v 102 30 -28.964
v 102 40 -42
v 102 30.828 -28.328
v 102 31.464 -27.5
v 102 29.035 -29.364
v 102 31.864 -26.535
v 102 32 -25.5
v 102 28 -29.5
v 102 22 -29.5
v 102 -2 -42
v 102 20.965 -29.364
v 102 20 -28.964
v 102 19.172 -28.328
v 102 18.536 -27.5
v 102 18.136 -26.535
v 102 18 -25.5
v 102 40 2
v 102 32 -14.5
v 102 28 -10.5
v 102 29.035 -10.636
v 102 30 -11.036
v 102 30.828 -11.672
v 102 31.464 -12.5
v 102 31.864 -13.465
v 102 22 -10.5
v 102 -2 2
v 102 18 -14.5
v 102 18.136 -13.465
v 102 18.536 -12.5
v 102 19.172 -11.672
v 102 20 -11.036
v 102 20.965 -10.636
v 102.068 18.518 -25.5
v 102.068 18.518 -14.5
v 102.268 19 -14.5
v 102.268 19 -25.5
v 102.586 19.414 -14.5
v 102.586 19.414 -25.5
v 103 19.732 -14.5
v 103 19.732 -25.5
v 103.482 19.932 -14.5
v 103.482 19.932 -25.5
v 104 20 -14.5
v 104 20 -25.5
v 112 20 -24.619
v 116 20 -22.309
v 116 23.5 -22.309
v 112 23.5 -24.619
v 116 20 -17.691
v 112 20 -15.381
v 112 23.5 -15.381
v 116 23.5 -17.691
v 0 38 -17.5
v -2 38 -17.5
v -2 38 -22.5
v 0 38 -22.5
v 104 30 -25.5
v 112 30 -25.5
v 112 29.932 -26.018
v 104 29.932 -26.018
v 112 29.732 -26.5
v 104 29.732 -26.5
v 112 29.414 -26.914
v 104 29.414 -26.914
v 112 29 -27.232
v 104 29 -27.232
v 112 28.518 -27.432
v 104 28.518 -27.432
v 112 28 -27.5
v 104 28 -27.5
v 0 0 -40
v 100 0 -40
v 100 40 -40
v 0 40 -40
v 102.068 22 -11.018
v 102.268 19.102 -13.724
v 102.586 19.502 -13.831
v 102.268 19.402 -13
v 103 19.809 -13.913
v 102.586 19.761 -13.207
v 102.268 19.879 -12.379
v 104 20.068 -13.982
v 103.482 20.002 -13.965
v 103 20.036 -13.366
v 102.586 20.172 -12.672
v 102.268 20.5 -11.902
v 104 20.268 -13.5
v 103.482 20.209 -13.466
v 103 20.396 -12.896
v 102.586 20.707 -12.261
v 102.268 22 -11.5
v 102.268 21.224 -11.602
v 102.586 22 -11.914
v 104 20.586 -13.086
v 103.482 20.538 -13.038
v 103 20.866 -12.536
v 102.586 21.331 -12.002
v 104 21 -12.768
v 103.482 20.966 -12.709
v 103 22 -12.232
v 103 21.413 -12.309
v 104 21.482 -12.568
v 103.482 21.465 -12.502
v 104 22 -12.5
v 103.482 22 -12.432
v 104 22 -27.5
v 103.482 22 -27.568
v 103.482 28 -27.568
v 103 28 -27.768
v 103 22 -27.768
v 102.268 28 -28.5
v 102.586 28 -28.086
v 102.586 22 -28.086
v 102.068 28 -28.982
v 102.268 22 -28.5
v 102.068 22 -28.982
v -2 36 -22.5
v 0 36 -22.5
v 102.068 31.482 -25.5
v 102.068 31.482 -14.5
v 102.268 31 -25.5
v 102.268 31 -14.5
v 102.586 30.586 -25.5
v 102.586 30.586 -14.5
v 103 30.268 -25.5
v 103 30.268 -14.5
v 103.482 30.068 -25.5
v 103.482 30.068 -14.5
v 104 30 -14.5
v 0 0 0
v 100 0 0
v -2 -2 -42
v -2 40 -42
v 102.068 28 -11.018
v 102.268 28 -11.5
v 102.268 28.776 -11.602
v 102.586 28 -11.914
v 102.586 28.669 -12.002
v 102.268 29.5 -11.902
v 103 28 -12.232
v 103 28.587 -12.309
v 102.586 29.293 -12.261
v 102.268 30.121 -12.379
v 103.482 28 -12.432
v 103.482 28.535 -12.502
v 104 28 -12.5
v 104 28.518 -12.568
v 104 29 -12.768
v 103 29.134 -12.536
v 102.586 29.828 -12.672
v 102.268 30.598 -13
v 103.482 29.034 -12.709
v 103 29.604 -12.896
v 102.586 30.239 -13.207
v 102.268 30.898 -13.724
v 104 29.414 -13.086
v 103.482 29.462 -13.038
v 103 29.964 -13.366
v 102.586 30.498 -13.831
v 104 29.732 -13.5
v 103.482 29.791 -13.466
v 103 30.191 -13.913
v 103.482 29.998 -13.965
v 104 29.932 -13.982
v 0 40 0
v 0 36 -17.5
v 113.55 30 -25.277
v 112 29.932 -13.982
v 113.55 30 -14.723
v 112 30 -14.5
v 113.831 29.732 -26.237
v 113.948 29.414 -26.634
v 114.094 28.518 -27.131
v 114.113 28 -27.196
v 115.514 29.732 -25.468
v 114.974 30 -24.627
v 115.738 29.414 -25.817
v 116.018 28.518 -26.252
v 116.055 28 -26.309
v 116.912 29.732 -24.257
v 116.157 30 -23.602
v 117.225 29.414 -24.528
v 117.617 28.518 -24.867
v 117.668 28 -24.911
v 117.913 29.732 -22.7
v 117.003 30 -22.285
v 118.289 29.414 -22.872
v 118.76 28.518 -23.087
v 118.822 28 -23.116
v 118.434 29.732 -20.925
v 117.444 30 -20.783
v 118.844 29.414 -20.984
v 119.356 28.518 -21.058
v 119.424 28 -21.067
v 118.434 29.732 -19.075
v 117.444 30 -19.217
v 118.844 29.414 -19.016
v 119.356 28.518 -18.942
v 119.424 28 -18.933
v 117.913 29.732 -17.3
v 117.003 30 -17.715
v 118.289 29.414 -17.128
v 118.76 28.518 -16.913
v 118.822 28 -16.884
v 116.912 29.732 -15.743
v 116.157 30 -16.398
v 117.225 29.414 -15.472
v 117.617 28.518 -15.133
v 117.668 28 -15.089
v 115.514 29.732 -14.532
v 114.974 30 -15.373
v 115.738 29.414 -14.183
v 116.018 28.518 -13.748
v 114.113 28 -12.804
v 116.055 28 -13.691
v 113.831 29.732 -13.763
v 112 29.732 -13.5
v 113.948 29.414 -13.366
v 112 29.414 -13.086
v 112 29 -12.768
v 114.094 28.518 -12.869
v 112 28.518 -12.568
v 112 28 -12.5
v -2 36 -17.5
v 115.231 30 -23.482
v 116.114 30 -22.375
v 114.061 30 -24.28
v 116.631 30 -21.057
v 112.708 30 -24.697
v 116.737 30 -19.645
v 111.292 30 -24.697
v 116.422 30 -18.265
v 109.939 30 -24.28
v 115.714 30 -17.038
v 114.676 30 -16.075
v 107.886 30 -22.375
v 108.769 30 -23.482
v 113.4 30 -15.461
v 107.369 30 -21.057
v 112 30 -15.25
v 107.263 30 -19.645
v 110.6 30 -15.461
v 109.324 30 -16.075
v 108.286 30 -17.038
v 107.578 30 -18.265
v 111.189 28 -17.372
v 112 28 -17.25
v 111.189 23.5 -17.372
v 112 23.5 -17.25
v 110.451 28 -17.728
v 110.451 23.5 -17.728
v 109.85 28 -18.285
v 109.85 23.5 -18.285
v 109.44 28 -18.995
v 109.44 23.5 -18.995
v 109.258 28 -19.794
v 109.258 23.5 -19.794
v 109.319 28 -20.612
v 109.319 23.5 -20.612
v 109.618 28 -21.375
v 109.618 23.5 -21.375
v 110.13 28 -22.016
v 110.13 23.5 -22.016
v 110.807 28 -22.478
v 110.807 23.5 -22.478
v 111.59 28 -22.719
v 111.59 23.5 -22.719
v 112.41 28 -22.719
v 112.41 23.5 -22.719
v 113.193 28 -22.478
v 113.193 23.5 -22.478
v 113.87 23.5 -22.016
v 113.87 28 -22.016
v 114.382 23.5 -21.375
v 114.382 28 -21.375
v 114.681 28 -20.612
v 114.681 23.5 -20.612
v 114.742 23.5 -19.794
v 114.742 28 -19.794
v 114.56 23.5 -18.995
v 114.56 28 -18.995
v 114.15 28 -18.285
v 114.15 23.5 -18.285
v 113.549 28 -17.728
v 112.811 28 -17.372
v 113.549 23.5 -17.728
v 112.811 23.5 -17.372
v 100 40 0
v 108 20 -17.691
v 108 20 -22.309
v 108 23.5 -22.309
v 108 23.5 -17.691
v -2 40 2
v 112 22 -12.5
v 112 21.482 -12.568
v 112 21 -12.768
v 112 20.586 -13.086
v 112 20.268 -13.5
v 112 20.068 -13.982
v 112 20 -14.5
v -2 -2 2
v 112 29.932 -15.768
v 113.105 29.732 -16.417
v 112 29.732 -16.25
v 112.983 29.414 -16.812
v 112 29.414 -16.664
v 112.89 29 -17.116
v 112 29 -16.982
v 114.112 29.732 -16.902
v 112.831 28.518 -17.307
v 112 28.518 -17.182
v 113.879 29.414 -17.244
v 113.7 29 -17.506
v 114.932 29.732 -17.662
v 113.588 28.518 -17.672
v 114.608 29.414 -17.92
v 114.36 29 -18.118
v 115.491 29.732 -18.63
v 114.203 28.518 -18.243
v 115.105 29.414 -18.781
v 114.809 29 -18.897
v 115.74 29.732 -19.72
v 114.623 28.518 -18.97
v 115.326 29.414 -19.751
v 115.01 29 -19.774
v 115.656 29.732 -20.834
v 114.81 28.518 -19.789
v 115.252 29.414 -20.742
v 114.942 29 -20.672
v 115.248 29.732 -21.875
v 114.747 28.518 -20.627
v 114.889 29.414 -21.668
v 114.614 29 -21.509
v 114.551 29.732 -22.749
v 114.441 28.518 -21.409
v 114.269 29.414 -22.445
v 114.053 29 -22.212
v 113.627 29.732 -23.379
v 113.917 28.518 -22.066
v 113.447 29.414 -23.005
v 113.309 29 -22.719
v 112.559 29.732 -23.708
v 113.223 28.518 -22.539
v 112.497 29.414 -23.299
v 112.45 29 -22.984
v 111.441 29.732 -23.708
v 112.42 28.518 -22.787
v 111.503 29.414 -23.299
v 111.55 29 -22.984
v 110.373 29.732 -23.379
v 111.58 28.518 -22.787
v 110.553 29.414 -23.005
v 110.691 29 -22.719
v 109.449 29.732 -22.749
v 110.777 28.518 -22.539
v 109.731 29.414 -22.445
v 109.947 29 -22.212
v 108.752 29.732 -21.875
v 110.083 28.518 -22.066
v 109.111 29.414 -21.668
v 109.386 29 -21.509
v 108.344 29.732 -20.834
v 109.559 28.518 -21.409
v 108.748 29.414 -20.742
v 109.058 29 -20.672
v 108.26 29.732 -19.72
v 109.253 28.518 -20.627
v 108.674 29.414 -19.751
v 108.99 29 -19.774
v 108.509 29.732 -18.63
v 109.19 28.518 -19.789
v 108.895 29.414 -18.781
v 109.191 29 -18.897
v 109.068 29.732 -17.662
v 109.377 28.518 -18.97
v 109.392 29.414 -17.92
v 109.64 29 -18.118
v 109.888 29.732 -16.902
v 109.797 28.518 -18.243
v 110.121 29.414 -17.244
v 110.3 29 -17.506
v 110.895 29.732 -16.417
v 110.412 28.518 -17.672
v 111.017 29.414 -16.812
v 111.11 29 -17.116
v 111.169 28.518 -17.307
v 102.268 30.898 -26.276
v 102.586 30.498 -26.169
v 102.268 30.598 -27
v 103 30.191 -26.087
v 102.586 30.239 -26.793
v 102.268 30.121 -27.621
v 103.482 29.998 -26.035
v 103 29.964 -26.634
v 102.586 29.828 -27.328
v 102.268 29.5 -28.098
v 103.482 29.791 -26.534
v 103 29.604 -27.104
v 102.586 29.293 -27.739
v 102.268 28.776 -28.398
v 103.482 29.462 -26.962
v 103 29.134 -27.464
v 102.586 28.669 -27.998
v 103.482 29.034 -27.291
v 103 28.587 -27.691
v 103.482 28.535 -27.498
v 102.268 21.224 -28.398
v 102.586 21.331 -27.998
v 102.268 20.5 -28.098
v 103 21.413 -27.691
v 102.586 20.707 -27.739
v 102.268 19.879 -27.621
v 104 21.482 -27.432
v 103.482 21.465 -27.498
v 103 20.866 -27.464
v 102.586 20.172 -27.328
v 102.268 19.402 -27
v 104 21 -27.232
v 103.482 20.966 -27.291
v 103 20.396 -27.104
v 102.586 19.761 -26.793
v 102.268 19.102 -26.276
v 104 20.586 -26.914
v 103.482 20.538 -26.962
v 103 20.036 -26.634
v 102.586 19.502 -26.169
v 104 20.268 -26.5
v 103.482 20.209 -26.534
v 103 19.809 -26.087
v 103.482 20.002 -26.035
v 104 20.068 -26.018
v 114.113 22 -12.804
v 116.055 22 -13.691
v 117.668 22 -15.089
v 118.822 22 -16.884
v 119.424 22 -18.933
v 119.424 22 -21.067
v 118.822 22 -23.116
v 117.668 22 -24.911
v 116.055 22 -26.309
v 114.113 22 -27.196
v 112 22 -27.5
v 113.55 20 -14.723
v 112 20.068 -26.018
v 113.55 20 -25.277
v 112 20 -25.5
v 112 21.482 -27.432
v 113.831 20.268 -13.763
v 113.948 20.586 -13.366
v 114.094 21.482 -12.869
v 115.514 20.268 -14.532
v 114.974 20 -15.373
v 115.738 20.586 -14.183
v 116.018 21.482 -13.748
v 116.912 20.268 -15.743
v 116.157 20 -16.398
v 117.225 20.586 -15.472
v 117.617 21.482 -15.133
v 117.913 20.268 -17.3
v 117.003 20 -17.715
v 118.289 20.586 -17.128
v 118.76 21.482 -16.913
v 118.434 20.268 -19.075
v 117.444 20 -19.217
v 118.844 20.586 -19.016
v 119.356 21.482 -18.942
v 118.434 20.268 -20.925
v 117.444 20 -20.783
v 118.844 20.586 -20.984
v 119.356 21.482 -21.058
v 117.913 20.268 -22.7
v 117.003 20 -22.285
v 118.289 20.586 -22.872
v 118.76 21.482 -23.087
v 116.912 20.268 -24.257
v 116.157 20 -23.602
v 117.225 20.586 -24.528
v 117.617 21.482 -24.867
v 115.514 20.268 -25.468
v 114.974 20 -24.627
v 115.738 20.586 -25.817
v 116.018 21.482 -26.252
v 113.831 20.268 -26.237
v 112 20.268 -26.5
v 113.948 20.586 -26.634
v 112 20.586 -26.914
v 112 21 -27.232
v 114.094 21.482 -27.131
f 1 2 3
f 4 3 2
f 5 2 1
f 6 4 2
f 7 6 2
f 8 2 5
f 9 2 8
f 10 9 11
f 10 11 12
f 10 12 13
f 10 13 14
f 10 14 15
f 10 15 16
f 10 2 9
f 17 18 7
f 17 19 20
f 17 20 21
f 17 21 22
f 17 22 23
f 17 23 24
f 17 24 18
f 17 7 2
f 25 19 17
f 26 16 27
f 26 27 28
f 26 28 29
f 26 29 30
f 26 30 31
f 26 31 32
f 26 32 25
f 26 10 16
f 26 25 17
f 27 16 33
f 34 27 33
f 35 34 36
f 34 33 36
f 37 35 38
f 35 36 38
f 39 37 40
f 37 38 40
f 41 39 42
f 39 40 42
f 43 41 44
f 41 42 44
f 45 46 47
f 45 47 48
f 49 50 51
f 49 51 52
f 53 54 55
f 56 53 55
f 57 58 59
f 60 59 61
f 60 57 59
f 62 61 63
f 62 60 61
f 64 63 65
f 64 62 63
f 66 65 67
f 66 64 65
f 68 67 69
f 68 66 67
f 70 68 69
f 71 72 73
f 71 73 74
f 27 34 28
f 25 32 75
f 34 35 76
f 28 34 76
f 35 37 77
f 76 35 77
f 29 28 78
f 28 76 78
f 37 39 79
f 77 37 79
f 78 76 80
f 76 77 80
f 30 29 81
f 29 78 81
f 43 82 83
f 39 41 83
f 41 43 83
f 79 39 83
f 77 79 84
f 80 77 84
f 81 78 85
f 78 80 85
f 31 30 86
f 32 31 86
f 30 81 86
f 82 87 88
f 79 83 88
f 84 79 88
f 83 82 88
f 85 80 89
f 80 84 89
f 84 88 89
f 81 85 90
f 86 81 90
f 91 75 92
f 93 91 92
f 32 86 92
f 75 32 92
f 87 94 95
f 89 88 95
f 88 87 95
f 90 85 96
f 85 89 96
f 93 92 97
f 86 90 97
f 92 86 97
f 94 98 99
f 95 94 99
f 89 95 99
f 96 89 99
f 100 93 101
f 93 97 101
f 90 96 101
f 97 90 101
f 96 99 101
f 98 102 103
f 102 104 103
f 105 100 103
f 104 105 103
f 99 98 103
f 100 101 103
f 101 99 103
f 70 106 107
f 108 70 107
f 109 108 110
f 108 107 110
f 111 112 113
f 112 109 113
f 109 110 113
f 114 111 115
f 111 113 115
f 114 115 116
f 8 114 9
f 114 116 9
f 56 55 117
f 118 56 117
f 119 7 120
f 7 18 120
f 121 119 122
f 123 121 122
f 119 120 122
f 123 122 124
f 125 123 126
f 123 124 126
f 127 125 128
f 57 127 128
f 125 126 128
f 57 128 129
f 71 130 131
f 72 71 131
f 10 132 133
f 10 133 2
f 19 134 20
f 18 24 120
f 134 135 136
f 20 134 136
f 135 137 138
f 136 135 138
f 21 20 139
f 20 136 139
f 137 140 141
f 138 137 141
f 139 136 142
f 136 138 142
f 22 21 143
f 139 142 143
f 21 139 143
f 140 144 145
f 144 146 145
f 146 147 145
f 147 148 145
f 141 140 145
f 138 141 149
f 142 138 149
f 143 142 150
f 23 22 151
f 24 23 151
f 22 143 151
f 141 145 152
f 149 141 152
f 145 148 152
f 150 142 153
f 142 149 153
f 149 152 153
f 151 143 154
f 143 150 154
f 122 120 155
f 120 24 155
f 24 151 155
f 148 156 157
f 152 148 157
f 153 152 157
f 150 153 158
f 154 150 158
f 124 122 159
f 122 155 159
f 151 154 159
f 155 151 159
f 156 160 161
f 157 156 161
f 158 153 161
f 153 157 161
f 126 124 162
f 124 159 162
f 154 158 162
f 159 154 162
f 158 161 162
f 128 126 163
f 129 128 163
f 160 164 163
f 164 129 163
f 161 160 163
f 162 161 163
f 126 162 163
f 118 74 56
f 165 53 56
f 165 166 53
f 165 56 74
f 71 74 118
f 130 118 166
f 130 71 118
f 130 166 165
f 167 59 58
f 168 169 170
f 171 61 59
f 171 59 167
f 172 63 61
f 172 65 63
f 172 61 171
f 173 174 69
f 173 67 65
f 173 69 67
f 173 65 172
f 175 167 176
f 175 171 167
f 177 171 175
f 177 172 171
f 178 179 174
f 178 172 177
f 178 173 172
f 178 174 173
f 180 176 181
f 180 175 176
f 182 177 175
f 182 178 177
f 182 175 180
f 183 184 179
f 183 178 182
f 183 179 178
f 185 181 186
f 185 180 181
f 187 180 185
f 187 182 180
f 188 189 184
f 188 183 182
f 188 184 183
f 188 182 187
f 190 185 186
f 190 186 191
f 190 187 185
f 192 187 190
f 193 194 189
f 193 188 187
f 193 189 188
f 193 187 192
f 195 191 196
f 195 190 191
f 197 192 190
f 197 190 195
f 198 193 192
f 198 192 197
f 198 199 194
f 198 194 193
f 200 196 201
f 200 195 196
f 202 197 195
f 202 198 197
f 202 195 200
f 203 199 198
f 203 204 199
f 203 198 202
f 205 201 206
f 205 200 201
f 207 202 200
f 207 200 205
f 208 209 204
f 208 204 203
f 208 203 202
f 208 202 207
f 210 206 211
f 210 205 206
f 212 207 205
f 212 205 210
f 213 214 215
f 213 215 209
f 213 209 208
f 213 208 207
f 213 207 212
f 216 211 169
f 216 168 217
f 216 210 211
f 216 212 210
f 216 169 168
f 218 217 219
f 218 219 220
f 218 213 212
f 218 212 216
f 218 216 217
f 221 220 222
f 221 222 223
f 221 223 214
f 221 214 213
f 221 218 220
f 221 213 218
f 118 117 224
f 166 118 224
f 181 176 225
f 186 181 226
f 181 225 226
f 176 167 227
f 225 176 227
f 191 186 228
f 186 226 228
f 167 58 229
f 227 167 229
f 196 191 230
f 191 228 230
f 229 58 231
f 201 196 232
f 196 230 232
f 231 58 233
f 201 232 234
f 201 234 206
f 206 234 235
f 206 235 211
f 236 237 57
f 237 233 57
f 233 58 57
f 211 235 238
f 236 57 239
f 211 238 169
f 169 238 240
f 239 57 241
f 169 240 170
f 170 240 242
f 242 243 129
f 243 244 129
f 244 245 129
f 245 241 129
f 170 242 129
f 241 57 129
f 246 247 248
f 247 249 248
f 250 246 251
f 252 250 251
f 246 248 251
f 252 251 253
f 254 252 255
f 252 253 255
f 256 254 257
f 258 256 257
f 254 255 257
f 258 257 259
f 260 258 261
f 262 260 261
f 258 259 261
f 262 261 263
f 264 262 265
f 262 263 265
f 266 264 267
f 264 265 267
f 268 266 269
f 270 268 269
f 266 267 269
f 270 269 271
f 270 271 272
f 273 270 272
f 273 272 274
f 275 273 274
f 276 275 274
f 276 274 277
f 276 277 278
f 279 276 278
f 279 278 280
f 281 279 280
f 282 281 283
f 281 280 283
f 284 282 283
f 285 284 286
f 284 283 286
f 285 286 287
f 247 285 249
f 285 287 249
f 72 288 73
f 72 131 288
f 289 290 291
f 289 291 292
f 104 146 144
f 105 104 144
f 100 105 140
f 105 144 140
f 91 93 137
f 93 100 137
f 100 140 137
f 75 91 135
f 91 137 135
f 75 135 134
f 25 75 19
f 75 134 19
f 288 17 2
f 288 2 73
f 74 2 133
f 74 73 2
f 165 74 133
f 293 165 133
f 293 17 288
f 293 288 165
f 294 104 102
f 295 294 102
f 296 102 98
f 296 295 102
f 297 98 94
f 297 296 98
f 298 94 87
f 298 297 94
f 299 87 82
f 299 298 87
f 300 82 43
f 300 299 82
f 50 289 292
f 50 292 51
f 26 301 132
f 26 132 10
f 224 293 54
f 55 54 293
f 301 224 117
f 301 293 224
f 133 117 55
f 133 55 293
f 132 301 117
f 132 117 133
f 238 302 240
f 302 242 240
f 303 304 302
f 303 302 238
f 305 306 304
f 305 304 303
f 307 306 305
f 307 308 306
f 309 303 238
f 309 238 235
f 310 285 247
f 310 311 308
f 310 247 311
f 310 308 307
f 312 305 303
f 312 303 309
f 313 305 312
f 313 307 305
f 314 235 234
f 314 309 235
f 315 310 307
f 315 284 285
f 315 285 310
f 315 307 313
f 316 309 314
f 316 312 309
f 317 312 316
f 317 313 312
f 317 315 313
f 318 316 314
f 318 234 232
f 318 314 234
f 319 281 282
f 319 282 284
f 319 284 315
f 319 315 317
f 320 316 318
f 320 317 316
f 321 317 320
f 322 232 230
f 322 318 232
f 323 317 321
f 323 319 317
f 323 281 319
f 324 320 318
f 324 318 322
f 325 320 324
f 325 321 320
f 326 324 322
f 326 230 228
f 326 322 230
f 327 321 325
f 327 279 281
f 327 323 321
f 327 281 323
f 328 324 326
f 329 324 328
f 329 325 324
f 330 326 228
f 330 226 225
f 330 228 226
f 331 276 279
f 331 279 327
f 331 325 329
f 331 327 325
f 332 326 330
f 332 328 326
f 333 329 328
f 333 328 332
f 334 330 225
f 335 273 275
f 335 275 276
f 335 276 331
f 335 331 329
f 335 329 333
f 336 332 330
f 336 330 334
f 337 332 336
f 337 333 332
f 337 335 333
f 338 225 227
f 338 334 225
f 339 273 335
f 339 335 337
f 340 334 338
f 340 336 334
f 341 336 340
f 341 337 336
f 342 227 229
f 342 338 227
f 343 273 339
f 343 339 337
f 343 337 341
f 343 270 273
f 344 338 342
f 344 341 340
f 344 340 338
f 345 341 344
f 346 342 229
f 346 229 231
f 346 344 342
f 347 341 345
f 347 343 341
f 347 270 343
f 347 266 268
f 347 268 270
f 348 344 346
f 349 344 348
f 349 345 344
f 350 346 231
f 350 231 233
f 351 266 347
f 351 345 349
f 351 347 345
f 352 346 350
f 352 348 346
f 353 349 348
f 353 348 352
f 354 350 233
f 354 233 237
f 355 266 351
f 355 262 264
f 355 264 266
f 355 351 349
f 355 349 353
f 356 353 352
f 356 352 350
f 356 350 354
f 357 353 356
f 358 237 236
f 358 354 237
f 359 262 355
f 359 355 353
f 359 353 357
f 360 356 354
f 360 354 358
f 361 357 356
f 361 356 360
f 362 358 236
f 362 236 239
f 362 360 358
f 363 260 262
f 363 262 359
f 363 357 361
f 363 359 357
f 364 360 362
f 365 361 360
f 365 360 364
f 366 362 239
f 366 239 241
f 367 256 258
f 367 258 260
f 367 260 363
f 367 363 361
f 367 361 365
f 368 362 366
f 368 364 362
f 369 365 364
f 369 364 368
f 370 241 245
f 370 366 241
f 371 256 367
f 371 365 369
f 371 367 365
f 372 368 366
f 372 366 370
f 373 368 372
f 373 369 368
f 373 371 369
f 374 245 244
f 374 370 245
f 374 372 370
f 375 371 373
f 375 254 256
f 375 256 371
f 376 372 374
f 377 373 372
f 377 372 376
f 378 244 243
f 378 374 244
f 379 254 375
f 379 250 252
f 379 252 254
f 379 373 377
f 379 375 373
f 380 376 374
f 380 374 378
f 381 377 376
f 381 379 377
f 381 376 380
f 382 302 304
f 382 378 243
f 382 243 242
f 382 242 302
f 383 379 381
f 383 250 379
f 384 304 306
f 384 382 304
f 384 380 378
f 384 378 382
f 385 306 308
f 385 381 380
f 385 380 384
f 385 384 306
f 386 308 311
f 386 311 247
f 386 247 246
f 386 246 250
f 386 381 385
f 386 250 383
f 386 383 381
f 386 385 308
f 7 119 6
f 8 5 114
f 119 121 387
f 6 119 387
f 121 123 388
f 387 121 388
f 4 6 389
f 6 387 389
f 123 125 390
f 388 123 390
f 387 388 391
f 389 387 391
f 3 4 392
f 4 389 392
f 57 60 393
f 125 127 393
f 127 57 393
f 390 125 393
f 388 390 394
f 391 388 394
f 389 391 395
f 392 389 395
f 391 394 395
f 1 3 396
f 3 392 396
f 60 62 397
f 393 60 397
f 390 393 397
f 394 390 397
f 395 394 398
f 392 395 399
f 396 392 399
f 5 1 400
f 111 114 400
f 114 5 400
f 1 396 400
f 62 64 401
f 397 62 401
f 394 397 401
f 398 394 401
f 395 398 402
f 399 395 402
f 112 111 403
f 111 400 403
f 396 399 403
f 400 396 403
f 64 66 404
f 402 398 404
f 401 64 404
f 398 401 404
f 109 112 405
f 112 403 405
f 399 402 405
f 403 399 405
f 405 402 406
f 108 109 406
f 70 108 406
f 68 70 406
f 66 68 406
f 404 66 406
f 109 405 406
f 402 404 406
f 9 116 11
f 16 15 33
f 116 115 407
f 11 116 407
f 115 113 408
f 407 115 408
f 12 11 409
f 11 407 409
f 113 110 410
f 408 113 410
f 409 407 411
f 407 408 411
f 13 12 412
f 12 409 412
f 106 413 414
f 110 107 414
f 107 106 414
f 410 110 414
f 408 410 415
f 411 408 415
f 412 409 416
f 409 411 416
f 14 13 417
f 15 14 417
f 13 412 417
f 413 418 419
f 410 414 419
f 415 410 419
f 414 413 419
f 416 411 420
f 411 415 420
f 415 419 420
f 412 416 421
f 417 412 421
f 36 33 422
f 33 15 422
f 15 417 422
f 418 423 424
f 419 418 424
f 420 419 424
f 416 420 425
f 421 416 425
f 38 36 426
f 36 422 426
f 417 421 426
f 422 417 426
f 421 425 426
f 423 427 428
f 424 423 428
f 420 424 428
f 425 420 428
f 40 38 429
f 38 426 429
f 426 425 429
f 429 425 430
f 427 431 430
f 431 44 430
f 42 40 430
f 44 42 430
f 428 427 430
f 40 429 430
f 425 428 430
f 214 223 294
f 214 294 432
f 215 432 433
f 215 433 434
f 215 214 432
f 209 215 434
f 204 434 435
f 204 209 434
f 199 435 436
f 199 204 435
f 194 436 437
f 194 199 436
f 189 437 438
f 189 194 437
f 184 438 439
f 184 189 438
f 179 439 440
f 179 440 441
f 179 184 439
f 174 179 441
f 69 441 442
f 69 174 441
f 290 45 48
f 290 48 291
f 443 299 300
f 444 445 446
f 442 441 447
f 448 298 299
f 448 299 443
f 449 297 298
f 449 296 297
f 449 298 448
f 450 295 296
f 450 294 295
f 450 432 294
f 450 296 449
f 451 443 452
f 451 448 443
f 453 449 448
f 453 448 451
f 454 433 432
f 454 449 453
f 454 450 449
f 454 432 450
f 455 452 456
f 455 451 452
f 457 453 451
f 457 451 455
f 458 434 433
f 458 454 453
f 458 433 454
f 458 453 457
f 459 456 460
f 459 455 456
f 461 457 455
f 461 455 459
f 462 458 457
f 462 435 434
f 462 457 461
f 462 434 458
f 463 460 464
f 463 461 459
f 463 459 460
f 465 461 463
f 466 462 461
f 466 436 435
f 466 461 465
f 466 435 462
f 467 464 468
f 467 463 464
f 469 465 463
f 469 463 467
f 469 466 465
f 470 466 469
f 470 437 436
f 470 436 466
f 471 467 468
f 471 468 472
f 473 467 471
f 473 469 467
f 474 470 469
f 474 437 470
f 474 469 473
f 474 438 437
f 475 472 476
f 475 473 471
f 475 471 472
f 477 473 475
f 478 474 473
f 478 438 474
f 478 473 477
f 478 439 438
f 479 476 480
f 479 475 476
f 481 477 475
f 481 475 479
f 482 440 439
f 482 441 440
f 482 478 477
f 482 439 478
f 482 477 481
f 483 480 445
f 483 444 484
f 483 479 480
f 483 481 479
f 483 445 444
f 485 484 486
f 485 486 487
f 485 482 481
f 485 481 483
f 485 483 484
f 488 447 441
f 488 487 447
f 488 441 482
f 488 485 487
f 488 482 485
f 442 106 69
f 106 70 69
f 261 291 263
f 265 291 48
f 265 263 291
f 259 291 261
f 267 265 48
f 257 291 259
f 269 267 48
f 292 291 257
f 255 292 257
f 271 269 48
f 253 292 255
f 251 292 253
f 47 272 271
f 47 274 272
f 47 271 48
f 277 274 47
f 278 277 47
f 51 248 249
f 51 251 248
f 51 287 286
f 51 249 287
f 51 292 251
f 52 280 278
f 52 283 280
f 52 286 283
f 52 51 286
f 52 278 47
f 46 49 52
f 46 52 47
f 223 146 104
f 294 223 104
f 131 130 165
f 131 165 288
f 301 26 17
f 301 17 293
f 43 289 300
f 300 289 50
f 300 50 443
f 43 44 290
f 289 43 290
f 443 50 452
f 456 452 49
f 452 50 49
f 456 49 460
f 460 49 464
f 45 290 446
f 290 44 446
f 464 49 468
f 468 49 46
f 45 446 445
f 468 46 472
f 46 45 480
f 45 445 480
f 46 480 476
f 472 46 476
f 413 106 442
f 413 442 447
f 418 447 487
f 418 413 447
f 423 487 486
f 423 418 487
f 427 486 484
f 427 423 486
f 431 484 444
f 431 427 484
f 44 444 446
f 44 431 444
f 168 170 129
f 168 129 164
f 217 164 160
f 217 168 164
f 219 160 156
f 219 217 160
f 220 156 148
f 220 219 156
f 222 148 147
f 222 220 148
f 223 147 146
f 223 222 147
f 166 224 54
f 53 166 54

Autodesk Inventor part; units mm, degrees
ref_plane "YZ Plane" through (0, 0, 0) normal (1, 0, 0) x (0, 1, 0)
ref_plane "XZ Plane" through (0, 0, 0) normal (0, 1, 0) x (-1, 0, 0)
ref_plane "XY Plane" through (0, 0, 0) normal (0, 0, 1) x (1, 0, 0)
sketch "Sketch1" plane through (0, 0, 0) normal (0, 1, 0) x (-1, 0, 0)
  line L0 (0, 0) -> (-100, 0)
  line L1 (-100, 0) -> (-100, -40)
  line L2 (-100, -40) -> (0, -40)
  line L3 (0, -40) -> (0, 0)
  line L4 (2, -42) -> (-102, -42)
  line L5 (-102, -42) -> (-102, 2)
  line L6 (-102, 2) -> (2, 2)
  line L7 (2, 2) -> (2, -42)
  dimension "Length" = 100
  dimension "Width" = 40
  dimension "Thickness" = 2
extrude "Extrusion1" add sketch "Sketch1" along normal blind 40
sketch "Sketch2" plane through (0, 0, 0) normal (0, -1, 0) x (1, 0, 0)
  line L0 (102, -42) -> (102, 2) projected
  line L1 (102, 2) -> (-2, 2) projected
  line L2 (-2, -42) -> (102, -42) projected
  line L3 (-2, 2) -> (-2, -42) projected
  point P0 (0, 0)
extrude "Extrusion2" add sketch "Sketch2" along normal blind 2
sketch "Sketch3" plane through (-2, 40, -42) normal (-1, 0, 0) x (0, 0, 1)
  line L0 (0, 0) -> (44, 0) projected
  line L1 (19.5, -4) -> (24.5, -4)
  line L2 (24.5, -4) -> (24.5, -2)
  line L3 (24.5, -2) -> (19.5, -2)
  line L4 (19.5, -2) -> (19.5, -4)
  line L5 (19.5, -4) -> (24.5, -2) construction
  line L6 (24.5, -4) -> (19.5, -2) construction
  line L7 (22, -3) -> (22, 0) construction
  point P0 (42, -40)
  dimension "d7" = 5
  dimension "d8" = 2
  dimension "d9" = 2
extrude "Extrusion3" cut sketch "Sketch3" against normal up to next
sketch "Sketch4" plane through (102, 40, 2) normal (1, 0, 0) x (0, 0, -1)
  line L0 (14.5, -12) -> (29.5, -12)
  line L1 (29.5, -12) -> (29.5, -10)
  line L2 (29.5, -10) -> (14.5, -10)
  line L3 (14.5, -10) -> (14.5, -12)
  line L4 (14.5, -12) -> (29.5, -10) construction
  line L5 (29.5, -12) -> (14.5, -10) construction
  line L6 (0, 0) -> (44, 0) projected
  line L7 (22, -11) -> (22, 0) construction
  line L8 (44, 0) -> (0, 0) projected
  point P0 (2, -40)
  dimension "d12" = 10
  dimension "d13" = 15
  dimension "d14" = 2
extrude "Extrusion4" add sketch "Sketch4" along normal blind 10
sketch "Sketch5" plane through (102, 30, -12.5) normal (0, 1, 0) x (1, 0, 0)
  line L0 (0, 0) -> (0, 15) projected
  line L1 (0, 0) -> (10, 0) projected
  line L2 (10, 15) -> (10, 0) projected
  line L3 (0, 15) -> (10, 15) projected
  line L4 (10, 0) -> (10, 15) projected
  arc A0 (10, 0) -> (10, 15) centre (10, 7.5) ccw
  point P0 (-102, -12.5)
extrude "Extrusion5" add sketch "Sketch5" against normal blind 10
sketch "Sketch6" plane through (102, 30, -12.5) normal (0, 1, 0) x (1, 0, 0)
  arc A0 (10, 0) -> (10, 15) centre (10, 7.5) ccw projected
  point P0 (-102, -12.5)
hole "Hole1" at (112, 30, -20) direction (0, -1, 0) diameter 5.5 end through all clearance for "Countersunk Flat Head Screw ISO 2009/7046" size "M5" standard "ISO"
fillet "Fillet1" radius 2 11 edges at (119.5, 30, -20) (107, 30, -12.5) (107, 30, -27.5) (112, 30, -22.75) (119.5, 20, -20) (107, 20, -12.5) (107, 20, -27.5) (102, 25, -27.5) (102, 20, -20) (102, 25, -12.5) (102, 30, -20)
sketch "Sketch7" plane through (102, 20, -12.5) normal (0, -1, 0) x (1, 0, 0)
  circle A0 centre (10, -7.5) radius 2.75 projected
  circle A1 centre (10, -7.5) radius 4 construction
  line L0 (14, -9.8094) -> (10, -12.1188)
  line L1 (10, -12.1188) -> (6, -9.8094)
  line L2 (6, -9.8094) -> (6, -5.1906)
  line L3 (6, -5.1906) -> (10, -2.8812)
  line L4 (10, -2.8812) -> (14, -5.1906)
  line L5 (14, -5.1906) -> (14, -9.8094)
  point P0 (-102, 12.5)
  point P1 (14, -7.5)
  dimension "d27" = 8
extrude "Extrusion6" cut sketch "Sketch7" against normal blind 3.5
equation "\"d5\" = Thickness"
equation "\"d10\" = Thickness"
equation "\"d14\" = Thickness"
properties part number "Casing_Part1"
